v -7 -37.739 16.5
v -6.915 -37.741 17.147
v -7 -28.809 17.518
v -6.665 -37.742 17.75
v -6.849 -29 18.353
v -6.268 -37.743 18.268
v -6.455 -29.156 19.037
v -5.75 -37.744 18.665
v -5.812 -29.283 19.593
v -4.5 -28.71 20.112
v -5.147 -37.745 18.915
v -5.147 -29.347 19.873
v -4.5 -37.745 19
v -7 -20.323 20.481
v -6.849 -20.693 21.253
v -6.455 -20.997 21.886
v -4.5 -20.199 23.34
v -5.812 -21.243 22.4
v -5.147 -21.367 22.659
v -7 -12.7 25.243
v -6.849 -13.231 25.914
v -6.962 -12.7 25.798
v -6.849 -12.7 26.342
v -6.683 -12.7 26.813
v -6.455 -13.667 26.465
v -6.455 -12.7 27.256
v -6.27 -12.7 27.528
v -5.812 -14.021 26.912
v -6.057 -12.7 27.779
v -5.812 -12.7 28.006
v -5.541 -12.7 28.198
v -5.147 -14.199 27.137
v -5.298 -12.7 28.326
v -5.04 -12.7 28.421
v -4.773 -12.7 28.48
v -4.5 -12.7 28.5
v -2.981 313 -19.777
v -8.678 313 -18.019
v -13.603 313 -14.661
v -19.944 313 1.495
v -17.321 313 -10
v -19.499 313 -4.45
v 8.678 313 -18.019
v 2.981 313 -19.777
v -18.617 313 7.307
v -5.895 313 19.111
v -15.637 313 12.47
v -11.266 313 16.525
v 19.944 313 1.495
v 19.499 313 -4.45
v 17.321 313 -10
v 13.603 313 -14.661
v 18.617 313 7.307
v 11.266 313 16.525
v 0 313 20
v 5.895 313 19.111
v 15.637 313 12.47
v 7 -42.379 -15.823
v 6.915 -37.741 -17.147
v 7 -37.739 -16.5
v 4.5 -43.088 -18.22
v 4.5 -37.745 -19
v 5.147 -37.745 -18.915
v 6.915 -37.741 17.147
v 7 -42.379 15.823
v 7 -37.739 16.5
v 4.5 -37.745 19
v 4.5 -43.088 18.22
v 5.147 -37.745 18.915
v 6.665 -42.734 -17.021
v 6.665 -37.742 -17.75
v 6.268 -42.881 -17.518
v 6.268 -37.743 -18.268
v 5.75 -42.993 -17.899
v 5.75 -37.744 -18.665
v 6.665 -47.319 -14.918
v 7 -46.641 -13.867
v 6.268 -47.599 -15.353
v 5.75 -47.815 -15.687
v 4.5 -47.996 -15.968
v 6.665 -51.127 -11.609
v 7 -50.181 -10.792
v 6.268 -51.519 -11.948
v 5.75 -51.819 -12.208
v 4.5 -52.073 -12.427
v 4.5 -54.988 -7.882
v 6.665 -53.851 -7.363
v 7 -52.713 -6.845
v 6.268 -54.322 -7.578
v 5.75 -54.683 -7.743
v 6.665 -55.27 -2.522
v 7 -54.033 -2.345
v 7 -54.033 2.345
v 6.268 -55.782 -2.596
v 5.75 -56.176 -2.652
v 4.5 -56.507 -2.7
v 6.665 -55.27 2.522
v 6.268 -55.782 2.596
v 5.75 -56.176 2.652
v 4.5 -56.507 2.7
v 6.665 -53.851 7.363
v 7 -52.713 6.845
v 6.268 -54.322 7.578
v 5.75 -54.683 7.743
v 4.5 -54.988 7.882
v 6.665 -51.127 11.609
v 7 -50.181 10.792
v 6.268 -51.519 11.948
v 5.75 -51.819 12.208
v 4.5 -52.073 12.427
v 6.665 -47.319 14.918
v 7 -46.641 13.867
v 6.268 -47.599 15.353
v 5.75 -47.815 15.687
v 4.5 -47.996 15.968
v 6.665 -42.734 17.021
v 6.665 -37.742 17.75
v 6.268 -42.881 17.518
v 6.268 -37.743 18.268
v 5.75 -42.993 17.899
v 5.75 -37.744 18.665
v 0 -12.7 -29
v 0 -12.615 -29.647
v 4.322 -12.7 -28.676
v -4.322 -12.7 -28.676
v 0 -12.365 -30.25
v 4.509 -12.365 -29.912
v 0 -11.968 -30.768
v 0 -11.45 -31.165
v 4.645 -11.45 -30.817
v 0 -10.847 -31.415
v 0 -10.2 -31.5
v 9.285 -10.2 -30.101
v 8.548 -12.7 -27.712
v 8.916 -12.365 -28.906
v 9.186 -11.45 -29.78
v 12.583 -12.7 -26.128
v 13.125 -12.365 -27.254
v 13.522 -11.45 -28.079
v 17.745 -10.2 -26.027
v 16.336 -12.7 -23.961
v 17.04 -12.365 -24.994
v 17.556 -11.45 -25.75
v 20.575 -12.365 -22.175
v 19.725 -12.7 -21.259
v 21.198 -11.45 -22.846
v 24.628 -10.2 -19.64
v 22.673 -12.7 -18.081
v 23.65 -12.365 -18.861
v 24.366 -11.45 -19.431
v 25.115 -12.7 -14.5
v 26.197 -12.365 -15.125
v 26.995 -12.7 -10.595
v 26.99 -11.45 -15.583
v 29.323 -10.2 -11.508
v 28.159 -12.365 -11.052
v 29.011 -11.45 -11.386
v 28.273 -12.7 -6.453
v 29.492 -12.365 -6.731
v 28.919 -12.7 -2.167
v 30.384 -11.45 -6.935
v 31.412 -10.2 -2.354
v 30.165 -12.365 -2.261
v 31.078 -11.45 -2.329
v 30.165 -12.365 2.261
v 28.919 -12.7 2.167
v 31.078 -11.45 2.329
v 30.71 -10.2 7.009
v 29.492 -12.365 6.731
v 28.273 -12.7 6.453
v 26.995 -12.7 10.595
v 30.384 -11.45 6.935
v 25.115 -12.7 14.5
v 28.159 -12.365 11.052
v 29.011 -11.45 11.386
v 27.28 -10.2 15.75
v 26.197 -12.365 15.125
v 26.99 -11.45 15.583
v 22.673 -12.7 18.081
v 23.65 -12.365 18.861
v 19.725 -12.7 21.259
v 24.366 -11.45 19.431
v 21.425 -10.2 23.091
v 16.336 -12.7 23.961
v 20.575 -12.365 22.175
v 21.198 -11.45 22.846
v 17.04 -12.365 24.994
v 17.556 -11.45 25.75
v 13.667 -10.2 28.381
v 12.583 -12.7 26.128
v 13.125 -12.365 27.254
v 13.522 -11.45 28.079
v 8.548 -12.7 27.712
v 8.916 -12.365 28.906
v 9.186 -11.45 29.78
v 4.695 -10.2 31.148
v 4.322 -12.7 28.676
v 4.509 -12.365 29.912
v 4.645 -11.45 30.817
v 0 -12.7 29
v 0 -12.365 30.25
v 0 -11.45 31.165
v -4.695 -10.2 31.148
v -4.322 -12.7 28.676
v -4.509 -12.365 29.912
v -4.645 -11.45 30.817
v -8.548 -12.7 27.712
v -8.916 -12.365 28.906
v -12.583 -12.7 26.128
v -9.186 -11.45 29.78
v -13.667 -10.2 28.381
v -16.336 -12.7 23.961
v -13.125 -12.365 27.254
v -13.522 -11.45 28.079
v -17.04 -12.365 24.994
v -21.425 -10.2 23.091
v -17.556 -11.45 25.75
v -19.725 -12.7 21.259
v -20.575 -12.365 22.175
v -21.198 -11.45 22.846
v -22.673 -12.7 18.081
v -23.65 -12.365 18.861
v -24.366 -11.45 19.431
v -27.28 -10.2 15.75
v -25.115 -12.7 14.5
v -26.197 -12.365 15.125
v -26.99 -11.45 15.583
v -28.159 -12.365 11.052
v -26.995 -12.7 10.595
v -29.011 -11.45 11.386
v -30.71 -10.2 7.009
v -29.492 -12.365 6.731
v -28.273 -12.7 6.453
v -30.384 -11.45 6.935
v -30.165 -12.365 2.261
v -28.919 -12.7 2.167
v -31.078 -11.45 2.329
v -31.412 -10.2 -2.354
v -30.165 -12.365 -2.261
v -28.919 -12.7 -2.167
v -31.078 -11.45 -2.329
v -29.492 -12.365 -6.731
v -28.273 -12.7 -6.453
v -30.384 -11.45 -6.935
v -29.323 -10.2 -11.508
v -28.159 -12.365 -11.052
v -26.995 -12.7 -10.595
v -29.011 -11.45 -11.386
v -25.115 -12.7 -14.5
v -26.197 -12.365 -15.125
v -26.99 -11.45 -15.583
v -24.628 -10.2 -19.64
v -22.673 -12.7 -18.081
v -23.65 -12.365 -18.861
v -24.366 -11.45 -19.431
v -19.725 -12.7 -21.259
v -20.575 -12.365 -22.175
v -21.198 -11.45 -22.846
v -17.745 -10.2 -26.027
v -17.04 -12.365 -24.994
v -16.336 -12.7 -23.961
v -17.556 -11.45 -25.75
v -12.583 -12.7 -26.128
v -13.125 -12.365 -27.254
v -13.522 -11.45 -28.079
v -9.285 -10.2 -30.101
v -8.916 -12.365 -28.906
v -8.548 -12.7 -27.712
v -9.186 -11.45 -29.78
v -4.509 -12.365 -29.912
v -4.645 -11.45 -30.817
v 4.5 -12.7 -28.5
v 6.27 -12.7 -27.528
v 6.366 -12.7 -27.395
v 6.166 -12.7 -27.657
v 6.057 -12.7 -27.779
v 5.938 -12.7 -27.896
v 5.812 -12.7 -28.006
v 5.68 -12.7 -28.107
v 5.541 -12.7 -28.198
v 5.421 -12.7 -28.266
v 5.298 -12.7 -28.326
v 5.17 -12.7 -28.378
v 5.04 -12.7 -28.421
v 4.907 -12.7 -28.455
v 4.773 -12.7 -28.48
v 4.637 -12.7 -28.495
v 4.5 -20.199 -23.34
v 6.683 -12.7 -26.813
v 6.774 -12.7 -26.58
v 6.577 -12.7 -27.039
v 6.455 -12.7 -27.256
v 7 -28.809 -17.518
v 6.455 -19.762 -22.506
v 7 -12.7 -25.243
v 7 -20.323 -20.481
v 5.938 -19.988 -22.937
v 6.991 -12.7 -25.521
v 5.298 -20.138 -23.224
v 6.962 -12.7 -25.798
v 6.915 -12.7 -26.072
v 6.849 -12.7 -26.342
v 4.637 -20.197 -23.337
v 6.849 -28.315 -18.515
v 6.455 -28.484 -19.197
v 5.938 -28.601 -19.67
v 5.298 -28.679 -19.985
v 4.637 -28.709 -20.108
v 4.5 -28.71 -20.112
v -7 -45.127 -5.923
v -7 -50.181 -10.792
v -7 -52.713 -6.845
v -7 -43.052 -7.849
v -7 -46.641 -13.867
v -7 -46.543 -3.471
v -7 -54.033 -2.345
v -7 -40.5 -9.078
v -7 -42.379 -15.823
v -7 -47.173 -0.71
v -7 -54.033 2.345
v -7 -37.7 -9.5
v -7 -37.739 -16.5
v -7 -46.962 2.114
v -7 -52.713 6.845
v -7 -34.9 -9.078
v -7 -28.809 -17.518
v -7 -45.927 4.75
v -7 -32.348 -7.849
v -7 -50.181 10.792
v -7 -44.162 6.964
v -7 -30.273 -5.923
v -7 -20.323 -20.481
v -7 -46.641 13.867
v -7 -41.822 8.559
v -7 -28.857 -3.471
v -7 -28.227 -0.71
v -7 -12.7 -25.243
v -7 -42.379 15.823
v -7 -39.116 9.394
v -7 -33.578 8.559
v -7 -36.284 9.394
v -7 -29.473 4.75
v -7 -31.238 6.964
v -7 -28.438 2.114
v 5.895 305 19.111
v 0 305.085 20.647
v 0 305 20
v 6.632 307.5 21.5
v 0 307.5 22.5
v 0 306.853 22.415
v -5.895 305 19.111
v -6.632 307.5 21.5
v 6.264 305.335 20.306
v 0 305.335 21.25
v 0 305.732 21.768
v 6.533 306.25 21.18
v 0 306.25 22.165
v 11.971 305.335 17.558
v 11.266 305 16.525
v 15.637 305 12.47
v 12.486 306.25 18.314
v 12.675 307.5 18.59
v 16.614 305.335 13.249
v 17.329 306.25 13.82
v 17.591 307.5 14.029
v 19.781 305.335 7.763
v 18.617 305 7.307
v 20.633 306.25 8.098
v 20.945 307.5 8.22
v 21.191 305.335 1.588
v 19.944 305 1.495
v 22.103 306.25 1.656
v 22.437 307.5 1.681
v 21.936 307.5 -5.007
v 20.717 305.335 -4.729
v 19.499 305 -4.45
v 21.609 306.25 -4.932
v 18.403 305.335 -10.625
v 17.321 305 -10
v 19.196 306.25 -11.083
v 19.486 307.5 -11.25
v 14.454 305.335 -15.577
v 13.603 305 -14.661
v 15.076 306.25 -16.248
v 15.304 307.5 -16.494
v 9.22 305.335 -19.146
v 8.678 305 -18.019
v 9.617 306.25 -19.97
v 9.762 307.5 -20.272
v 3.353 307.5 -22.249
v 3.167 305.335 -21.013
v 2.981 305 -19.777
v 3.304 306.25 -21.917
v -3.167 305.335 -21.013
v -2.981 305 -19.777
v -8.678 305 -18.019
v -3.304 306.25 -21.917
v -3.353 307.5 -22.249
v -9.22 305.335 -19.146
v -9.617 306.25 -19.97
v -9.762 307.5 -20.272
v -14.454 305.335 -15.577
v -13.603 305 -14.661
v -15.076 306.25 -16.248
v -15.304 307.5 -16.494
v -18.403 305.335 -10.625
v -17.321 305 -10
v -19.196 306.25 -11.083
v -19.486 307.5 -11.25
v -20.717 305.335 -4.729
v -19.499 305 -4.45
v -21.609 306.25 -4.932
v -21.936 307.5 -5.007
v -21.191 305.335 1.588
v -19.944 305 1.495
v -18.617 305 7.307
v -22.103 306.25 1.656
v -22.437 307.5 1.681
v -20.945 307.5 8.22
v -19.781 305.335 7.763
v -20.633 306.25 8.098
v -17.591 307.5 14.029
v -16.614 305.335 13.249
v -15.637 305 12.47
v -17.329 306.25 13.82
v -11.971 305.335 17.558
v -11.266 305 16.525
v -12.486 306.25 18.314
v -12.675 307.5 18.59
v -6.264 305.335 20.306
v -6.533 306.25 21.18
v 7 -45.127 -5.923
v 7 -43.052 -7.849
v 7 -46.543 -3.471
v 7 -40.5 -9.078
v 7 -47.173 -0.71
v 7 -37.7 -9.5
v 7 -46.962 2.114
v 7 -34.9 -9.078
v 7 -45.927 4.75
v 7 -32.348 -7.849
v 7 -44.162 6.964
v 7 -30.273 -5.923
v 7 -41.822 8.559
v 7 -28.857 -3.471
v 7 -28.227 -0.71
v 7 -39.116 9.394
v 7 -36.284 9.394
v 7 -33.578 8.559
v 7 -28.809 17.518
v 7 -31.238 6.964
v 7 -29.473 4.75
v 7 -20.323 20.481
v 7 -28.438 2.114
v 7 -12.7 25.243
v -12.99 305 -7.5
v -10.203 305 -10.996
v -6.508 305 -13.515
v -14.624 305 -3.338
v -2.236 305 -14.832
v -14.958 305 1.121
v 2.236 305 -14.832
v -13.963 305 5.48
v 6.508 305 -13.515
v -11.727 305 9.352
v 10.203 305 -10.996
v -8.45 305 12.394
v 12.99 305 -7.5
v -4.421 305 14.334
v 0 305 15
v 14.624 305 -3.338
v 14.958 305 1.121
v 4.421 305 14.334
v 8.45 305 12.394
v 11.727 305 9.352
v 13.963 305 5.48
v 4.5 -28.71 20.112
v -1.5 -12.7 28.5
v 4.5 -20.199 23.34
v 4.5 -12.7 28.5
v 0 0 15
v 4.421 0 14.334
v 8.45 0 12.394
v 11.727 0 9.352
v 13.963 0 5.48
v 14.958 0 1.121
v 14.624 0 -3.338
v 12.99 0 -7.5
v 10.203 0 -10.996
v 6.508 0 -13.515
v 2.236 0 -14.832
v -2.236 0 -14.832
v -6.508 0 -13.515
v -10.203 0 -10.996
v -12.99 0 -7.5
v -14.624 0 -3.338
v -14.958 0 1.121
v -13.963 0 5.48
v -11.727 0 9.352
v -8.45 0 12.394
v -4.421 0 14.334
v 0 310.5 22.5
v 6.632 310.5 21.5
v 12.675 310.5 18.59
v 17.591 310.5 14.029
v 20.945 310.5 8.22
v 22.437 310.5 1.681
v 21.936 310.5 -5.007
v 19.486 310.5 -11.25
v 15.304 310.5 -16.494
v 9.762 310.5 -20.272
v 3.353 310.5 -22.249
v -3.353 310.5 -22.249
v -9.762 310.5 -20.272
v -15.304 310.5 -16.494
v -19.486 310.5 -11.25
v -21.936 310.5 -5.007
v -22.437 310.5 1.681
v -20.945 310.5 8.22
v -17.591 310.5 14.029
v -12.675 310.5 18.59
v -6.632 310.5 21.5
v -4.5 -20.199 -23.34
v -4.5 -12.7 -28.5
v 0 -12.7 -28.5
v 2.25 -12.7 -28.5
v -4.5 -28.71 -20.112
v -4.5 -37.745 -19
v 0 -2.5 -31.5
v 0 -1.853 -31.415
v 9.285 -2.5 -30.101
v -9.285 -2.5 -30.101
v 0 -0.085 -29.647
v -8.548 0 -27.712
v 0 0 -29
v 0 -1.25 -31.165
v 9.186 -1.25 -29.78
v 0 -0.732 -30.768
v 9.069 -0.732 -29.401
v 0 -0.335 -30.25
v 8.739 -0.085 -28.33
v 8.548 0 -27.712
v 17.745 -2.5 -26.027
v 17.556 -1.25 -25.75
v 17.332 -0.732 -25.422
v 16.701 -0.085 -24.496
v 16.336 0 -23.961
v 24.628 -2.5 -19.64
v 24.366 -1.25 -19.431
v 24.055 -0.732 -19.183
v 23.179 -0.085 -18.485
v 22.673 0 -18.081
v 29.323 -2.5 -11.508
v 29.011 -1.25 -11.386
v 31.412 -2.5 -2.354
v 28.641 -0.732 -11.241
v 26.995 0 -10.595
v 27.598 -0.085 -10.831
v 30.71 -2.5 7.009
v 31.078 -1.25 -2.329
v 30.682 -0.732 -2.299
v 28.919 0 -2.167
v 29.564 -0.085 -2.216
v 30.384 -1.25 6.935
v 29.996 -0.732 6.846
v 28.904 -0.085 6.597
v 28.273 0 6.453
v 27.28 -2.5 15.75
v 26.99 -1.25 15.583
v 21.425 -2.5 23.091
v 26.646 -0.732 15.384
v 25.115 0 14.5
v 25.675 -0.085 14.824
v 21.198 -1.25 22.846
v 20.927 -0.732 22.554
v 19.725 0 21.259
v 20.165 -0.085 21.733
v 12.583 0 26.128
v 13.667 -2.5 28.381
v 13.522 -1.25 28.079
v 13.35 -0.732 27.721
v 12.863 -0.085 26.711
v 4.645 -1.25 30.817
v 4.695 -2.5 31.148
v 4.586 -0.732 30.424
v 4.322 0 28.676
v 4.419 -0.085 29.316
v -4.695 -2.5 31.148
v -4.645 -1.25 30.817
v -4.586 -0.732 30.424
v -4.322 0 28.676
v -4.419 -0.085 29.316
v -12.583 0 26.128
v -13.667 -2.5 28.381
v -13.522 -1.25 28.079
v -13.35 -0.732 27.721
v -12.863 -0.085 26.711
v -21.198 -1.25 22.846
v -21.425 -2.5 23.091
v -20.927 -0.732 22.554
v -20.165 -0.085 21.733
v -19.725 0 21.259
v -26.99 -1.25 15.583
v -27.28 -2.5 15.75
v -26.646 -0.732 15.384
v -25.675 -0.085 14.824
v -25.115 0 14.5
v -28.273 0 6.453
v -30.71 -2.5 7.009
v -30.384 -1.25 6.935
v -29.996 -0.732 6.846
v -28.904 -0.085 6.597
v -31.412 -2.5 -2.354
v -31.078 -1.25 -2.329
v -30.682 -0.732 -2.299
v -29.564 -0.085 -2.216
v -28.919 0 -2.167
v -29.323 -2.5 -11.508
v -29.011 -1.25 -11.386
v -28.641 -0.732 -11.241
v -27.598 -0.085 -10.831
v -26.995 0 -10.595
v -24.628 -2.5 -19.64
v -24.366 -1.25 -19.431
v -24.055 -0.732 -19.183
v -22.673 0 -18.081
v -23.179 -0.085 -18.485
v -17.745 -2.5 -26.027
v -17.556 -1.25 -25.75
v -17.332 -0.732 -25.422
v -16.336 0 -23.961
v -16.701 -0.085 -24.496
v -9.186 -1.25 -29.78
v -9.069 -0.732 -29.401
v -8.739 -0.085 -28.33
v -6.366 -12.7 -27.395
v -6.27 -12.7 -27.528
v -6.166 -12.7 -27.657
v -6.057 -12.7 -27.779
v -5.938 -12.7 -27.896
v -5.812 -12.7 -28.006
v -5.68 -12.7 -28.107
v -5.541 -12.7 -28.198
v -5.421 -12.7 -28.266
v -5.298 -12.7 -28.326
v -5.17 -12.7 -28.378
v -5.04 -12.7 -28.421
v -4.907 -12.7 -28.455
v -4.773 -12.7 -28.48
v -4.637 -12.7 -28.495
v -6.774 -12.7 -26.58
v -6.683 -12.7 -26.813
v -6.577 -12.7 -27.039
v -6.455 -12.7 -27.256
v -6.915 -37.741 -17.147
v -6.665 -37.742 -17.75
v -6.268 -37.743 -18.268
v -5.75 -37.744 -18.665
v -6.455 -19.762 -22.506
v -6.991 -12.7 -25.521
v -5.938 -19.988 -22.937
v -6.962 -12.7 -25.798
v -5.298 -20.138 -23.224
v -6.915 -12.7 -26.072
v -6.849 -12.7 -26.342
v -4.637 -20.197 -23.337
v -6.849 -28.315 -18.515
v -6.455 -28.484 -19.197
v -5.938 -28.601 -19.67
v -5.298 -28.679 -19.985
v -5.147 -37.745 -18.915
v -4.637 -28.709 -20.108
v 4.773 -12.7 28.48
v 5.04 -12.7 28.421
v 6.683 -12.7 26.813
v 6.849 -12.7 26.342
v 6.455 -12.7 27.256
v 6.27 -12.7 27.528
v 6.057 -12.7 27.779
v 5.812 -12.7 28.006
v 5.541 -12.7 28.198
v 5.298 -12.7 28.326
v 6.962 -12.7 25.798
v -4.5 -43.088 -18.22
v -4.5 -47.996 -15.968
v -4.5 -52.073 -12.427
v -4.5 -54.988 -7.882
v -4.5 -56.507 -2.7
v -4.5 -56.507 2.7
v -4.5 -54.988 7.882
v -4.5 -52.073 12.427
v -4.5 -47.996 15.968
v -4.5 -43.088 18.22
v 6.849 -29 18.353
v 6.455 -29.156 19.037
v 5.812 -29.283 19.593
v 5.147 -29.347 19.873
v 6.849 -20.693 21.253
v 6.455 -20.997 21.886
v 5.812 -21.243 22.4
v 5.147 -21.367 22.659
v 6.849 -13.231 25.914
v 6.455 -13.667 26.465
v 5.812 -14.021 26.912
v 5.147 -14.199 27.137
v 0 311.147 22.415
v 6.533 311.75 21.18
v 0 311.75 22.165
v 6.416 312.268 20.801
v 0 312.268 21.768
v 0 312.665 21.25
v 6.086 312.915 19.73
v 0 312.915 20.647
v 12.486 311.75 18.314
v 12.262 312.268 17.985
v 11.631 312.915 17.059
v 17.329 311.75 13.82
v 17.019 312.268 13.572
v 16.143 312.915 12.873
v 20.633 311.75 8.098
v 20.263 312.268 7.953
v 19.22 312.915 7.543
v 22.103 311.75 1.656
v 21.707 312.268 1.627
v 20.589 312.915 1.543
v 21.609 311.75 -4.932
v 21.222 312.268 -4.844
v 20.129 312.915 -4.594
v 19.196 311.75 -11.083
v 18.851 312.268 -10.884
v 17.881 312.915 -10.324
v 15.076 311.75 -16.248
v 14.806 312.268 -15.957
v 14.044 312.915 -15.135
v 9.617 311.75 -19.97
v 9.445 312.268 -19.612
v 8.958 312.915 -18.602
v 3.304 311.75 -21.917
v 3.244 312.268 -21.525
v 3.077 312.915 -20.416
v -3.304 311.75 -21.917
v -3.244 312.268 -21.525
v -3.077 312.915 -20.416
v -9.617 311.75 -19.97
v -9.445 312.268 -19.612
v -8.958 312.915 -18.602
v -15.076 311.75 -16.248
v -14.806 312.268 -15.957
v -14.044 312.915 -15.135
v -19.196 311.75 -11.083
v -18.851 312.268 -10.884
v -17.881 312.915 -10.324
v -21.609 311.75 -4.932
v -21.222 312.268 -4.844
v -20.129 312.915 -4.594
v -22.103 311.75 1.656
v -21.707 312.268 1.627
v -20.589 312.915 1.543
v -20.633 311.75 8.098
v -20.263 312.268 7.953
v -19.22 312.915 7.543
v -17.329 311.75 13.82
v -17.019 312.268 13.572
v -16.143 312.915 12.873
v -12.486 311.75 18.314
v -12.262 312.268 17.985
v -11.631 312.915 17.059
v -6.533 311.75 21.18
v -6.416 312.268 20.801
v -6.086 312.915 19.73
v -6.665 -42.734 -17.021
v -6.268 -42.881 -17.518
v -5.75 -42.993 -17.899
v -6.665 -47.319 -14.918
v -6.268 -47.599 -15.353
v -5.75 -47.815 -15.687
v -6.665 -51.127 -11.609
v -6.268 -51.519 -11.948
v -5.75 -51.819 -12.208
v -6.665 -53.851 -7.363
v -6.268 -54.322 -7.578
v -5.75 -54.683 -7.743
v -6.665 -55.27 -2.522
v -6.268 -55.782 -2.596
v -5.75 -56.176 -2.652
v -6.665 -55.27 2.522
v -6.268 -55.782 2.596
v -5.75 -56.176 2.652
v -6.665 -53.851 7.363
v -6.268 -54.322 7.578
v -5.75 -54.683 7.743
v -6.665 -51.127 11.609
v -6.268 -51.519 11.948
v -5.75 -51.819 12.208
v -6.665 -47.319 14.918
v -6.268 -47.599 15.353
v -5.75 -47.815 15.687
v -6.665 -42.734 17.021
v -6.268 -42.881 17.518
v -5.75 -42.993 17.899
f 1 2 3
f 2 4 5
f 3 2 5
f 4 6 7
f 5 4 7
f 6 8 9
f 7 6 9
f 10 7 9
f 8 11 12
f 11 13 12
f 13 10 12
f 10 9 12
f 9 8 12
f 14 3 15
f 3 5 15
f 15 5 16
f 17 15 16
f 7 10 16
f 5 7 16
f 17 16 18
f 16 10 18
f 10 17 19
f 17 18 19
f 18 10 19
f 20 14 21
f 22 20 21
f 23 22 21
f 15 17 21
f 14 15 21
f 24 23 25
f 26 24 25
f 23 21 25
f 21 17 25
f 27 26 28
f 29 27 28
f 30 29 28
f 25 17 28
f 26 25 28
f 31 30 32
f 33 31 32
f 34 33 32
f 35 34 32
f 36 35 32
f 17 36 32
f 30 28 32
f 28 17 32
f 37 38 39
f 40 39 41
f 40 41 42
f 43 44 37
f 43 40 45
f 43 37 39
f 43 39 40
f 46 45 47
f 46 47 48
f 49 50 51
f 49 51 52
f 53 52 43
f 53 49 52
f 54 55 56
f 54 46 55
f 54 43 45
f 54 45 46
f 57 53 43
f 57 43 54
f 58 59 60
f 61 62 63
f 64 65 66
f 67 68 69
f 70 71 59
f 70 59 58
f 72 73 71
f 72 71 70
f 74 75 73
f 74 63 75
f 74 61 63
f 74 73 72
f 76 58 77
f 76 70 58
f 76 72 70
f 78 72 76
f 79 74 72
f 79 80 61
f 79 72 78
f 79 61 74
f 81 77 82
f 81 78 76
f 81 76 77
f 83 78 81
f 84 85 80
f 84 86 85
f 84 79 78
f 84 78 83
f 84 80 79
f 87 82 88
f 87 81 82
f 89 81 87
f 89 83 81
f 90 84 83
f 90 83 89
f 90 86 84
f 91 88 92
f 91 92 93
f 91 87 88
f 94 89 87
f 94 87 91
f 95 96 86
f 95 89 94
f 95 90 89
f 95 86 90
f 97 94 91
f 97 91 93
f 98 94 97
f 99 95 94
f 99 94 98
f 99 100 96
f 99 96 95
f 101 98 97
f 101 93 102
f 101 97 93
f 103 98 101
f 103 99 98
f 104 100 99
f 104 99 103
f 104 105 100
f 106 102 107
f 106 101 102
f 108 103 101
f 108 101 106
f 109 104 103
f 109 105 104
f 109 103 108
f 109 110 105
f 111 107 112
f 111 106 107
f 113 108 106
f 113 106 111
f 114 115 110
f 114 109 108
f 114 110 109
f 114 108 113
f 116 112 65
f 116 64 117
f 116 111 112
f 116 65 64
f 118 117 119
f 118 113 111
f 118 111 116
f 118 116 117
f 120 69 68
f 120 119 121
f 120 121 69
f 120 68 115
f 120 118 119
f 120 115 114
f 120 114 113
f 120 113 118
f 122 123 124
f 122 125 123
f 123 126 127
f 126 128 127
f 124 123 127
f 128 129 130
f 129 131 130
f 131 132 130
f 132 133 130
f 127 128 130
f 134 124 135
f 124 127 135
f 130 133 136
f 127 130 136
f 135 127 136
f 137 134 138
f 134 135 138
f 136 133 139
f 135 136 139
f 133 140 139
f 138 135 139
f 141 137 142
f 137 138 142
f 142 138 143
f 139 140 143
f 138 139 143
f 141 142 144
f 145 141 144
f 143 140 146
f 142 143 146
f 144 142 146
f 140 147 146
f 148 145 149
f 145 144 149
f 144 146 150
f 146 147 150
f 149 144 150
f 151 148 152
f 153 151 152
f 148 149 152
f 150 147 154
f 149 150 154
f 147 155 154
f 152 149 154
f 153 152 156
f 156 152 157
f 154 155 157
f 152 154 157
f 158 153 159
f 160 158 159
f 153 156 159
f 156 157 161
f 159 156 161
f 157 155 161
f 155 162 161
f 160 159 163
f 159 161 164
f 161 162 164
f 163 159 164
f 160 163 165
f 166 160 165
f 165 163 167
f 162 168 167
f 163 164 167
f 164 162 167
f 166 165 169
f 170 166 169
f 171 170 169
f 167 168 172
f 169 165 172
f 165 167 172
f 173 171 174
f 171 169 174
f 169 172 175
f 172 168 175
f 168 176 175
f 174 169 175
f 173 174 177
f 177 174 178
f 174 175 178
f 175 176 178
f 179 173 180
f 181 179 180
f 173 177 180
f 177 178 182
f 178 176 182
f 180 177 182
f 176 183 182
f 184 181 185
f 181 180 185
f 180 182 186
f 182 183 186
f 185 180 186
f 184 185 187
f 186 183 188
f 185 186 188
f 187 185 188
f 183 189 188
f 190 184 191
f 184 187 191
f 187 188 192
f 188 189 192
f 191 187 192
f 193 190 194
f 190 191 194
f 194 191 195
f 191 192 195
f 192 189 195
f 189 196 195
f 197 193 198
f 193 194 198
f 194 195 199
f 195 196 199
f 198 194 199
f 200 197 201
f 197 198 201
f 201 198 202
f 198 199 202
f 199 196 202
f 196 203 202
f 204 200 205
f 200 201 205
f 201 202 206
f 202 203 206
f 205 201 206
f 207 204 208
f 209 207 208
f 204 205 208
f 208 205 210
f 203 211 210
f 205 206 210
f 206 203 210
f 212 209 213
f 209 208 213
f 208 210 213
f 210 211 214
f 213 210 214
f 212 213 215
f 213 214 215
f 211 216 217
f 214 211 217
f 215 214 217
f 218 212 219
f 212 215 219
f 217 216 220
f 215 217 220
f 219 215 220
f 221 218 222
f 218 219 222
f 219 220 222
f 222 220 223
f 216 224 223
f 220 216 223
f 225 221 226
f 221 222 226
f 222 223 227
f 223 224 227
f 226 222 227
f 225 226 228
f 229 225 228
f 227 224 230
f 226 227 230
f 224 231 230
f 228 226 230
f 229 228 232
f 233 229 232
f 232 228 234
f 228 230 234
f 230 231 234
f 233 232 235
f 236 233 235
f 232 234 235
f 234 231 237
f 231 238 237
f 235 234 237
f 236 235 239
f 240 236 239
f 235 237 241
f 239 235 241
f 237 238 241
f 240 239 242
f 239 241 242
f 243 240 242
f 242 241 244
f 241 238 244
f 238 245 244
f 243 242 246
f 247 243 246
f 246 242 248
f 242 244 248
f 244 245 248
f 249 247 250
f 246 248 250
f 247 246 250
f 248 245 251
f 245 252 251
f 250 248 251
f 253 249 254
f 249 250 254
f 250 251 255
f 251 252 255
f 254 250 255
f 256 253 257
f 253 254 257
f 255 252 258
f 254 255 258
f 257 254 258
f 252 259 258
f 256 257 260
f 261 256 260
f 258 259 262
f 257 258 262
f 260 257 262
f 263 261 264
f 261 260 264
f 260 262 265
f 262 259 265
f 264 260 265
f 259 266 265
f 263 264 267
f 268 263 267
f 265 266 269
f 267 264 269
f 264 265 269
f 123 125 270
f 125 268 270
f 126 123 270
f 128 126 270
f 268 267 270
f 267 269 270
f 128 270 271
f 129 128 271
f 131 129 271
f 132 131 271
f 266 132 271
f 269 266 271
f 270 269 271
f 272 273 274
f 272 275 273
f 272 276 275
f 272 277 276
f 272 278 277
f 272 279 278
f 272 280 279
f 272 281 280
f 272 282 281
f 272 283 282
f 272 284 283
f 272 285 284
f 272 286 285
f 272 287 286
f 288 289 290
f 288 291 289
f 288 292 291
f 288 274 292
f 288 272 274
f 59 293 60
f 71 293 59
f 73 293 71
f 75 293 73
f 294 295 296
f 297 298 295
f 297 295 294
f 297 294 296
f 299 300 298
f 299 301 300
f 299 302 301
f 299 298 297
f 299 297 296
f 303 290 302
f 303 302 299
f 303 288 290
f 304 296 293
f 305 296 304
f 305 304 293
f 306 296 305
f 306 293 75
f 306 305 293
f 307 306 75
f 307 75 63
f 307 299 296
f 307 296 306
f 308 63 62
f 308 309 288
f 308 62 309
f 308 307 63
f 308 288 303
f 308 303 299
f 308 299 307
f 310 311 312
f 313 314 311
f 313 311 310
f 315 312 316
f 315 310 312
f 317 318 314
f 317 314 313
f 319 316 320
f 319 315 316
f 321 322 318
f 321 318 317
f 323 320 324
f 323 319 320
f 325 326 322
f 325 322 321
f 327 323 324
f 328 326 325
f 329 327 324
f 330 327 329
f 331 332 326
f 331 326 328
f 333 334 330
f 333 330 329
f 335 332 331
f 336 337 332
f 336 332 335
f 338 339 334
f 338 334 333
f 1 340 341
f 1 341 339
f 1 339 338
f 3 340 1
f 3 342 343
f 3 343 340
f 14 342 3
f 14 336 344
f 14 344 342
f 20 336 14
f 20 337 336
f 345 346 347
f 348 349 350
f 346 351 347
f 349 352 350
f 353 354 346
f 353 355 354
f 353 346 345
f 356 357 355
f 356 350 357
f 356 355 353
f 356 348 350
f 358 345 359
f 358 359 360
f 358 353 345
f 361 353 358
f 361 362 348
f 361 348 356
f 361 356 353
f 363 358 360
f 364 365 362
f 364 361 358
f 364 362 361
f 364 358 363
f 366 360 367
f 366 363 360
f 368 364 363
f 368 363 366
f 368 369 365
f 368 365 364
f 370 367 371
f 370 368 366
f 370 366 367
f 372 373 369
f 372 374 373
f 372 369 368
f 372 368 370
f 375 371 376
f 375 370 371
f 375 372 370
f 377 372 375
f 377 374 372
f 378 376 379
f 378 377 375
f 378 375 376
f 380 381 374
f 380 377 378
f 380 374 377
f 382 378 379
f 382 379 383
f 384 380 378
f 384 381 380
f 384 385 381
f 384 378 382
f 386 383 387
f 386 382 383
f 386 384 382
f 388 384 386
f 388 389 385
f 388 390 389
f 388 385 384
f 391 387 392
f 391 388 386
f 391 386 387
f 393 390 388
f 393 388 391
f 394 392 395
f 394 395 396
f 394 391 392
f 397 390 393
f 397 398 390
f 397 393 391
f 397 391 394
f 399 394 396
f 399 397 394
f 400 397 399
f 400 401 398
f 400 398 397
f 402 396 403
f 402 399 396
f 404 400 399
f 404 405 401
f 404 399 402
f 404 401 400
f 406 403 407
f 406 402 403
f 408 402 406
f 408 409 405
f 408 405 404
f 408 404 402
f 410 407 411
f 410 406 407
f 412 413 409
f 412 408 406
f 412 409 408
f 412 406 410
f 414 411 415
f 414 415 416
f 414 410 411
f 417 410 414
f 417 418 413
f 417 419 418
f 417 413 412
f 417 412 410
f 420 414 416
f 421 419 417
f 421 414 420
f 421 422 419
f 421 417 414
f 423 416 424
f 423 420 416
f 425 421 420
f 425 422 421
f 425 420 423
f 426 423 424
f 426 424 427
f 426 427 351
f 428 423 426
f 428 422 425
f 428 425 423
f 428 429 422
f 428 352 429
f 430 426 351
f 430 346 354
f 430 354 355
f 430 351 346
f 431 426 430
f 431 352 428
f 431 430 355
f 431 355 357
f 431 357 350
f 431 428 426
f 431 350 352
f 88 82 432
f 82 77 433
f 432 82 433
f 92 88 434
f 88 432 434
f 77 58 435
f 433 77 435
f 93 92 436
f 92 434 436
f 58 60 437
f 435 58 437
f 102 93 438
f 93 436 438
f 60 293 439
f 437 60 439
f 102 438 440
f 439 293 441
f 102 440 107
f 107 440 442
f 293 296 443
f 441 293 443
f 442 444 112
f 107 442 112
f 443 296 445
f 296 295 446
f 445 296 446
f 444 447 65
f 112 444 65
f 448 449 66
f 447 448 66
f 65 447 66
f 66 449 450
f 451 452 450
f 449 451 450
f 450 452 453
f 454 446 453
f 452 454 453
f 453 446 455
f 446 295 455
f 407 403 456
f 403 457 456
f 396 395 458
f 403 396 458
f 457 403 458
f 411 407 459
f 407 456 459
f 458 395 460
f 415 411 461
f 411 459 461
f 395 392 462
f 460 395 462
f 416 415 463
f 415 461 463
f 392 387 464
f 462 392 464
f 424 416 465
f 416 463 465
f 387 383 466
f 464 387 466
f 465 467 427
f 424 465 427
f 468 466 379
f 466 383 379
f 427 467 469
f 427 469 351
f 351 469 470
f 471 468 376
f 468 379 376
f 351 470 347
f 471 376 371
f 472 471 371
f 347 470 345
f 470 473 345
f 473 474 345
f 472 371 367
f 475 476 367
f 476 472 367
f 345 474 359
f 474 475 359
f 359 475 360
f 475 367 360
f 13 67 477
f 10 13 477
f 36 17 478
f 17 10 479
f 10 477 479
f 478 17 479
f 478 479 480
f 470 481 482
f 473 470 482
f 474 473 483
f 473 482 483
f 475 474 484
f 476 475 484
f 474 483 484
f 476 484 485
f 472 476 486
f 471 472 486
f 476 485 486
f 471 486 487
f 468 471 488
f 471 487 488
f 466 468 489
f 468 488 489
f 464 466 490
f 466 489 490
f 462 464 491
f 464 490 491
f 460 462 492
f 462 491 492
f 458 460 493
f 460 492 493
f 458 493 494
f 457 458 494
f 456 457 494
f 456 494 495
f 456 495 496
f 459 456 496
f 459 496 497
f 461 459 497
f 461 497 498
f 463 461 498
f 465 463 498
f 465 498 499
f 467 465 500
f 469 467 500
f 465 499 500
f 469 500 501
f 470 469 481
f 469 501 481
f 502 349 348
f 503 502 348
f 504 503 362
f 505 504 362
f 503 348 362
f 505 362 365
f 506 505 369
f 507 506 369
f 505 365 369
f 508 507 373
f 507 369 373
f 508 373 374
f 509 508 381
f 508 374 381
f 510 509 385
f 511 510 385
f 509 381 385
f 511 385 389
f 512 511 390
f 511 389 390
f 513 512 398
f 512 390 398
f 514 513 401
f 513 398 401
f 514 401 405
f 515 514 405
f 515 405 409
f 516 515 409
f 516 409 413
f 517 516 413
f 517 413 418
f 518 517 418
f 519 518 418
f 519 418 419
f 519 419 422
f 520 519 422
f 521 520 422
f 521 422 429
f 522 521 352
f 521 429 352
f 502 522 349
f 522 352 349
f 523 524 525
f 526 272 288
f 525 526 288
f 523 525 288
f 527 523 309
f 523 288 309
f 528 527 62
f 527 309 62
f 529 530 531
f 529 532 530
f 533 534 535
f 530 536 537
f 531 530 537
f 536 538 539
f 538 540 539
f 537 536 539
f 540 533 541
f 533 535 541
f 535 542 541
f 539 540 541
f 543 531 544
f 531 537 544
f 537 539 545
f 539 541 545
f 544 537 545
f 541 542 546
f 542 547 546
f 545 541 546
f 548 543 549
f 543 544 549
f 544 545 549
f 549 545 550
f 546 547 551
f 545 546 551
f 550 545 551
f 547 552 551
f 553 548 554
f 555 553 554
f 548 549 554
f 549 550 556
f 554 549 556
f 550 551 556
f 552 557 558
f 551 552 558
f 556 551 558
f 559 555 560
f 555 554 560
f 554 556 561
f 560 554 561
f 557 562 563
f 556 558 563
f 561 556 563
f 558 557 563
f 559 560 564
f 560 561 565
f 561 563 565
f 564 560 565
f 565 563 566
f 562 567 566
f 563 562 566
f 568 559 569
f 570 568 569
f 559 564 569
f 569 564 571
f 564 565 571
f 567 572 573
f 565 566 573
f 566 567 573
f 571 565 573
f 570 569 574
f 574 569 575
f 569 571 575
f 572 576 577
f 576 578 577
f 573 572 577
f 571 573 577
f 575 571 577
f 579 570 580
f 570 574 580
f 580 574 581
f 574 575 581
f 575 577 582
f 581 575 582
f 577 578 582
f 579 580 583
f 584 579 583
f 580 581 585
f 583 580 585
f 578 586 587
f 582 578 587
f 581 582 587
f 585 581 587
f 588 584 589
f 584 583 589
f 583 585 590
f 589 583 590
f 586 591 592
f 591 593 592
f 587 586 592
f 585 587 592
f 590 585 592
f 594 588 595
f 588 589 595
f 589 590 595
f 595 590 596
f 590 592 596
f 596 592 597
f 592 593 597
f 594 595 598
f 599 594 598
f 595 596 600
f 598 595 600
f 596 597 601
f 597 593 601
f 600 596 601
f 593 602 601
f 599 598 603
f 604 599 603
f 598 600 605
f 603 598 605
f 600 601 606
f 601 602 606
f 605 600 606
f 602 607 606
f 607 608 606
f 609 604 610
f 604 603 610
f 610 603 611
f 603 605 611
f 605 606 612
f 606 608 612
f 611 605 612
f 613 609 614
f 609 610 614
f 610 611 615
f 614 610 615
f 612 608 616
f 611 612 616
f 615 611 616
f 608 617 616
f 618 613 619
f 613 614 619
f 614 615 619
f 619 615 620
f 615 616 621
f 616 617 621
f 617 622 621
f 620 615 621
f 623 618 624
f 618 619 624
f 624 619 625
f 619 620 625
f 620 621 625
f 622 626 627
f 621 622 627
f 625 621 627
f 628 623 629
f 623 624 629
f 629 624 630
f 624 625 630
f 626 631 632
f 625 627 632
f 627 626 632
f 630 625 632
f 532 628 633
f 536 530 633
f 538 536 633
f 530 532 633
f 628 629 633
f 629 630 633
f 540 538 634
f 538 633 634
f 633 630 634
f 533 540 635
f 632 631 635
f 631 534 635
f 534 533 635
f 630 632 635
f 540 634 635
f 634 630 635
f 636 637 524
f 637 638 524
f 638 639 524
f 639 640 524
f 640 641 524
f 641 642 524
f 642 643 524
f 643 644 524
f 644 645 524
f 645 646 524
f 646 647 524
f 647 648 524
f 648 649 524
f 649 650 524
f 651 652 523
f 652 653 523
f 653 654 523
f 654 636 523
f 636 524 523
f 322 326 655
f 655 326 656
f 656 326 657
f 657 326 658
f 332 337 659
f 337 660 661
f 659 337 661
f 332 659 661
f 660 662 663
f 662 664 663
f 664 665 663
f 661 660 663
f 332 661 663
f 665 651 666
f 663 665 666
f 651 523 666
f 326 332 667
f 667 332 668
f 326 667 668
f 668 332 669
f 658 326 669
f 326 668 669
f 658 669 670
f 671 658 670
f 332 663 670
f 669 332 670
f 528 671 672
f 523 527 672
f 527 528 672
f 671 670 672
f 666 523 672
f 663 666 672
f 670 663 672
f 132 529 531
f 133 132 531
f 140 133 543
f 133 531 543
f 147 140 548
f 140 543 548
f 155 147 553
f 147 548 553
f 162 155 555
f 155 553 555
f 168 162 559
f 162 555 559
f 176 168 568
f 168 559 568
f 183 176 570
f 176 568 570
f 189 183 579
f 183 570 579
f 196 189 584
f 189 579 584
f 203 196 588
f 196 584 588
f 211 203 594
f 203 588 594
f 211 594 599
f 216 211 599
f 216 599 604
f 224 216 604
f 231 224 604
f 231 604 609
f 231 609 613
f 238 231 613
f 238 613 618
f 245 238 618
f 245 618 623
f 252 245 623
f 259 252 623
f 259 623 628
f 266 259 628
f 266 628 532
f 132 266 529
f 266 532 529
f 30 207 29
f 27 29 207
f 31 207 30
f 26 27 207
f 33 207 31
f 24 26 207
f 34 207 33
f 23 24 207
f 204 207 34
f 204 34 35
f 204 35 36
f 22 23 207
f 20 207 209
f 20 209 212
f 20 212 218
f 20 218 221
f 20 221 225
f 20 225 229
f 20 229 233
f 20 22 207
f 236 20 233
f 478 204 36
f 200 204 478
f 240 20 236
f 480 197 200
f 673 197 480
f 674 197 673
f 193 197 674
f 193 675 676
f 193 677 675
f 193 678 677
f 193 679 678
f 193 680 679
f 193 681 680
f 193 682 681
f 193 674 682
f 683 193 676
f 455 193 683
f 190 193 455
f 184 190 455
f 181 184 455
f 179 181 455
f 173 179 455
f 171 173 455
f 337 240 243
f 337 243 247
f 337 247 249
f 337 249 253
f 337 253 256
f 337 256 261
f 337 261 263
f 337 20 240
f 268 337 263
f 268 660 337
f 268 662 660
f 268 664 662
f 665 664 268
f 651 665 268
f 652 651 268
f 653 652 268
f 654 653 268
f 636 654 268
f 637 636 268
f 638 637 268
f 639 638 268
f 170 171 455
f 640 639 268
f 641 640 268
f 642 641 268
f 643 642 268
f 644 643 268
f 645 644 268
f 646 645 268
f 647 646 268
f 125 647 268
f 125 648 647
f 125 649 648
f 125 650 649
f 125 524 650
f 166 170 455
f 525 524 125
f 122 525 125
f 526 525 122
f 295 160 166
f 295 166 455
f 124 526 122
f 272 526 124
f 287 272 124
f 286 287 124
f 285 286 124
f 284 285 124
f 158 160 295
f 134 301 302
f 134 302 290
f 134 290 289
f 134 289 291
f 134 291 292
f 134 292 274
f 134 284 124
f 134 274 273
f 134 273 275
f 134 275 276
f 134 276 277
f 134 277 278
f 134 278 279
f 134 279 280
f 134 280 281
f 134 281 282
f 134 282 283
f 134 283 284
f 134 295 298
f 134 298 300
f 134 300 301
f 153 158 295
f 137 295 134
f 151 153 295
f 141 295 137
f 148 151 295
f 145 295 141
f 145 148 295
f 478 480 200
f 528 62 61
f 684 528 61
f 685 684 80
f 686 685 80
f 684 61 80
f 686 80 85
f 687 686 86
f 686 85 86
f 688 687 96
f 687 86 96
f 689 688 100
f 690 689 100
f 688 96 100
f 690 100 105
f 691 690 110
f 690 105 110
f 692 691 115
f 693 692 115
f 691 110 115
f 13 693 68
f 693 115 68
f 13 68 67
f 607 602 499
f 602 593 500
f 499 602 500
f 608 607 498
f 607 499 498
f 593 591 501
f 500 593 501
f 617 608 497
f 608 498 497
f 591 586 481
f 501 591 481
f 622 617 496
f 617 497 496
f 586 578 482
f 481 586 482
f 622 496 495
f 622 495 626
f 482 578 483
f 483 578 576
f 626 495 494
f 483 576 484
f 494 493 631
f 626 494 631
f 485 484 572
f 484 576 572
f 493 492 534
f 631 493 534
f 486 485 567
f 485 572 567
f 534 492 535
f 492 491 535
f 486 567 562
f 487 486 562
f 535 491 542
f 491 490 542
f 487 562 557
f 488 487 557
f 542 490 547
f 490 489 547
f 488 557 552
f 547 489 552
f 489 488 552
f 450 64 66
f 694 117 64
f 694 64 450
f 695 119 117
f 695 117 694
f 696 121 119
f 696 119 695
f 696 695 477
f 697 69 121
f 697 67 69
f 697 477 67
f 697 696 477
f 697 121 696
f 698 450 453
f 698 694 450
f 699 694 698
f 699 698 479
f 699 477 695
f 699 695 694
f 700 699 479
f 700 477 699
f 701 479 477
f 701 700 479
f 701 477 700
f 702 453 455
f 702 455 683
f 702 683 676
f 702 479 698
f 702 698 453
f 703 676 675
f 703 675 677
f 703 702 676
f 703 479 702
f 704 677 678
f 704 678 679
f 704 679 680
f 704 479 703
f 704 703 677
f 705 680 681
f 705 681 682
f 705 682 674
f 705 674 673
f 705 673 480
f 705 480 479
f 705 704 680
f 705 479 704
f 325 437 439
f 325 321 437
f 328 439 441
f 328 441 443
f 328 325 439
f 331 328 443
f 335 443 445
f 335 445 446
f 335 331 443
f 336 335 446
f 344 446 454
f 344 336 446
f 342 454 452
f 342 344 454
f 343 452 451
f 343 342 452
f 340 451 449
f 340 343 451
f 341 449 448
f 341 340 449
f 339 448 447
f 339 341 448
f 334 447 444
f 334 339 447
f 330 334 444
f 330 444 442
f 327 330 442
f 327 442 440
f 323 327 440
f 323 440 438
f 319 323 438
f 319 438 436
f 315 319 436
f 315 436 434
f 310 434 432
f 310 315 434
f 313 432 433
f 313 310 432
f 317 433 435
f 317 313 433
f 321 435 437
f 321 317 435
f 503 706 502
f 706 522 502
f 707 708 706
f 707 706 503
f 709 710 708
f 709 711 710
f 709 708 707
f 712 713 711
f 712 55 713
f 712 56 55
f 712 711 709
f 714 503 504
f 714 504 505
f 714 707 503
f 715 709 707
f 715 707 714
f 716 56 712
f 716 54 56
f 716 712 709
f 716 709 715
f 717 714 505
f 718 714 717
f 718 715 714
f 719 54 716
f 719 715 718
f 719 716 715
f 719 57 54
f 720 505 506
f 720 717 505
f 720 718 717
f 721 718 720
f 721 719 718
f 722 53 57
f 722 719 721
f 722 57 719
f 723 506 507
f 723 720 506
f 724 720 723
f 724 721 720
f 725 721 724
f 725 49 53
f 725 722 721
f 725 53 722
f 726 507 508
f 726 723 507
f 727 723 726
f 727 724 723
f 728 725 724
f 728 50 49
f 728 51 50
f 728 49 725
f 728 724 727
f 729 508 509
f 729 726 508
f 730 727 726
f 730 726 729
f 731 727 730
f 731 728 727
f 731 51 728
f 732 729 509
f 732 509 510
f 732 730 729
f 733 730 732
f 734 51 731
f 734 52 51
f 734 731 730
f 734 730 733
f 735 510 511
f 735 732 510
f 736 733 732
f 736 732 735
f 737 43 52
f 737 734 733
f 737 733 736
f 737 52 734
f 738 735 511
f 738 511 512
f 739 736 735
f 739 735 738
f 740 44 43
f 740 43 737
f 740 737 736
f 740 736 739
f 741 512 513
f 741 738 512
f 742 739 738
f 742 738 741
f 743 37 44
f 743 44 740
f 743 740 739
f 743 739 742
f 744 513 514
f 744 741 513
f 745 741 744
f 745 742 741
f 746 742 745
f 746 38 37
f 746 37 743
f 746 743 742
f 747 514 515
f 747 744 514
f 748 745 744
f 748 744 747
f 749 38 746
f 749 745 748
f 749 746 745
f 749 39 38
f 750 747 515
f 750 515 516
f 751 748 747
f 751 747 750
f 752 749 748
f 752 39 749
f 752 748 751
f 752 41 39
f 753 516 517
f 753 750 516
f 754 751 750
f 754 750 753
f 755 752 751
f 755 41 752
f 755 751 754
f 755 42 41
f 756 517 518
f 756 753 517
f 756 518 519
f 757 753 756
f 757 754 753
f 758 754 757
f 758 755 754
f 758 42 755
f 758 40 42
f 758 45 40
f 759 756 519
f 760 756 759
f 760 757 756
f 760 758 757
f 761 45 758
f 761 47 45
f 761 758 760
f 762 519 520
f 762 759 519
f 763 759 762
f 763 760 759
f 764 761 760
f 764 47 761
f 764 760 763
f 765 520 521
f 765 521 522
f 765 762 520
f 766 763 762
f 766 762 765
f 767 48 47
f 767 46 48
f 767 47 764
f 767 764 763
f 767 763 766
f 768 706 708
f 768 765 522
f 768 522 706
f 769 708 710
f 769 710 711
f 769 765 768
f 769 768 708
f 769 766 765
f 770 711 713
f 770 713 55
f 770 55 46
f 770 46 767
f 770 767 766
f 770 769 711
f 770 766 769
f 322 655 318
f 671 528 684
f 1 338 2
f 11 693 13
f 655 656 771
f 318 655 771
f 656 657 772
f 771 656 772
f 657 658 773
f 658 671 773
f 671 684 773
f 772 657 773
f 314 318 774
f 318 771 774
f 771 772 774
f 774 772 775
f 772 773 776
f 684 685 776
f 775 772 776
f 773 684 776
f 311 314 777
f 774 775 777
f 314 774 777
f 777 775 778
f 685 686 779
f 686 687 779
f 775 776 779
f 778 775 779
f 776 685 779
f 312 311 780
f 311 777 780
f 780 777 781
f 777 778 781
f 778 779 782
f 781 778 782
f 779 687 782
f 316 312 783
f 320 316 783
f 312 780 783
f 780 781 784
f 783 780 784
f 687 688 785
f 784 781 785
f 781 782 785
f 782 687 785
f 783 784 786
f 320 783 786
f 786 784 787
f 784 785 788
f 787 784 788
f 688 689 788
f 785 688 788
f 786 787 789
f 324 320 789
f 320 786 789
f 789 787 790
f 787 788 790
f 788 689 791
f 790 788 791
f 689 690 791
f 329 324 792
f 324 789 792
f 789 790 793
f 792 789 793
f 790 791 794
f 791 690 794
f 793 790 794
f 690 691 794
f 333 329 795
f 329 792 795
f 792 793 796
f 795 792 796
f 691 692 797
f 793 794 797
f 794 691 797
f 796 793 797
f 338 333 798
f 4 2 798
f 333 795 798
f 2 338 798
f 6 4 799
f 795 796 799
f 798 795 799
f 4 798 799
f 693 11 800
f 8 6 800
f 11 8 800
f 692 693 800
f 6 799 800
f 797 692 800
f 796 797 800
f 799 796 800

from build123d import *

# Parameters (mm, degrees)
SKETCH1_R           = 15
BOSS_EXTRUDE1_DEPTH = 305
SKETCH2_R           = 22.5
BOSS_EXTRUDE2_DEPTH = 8
SKETCH3_R           = 31.5
BOSS_EXTRUDE3_DEPTH = 12.7
SKETCH4_R           = 9.5
BOSS_EXTRUDE4_DEPTH = 7
FILLET3_R           = 2.5
FILLET4_R           = 2.5
FILLET5_R           = 2.5


with BuildPart() as part:
    # Sketch1 → Boss-Extrude1 (new body)
    with BuildSketch(Plane(origin=(0, 0, 0), x_dir=(1, 0, 0), z_dir=(0, 1, 0))):
        with Locations(Location((0, 0, 0), (0, 0, 270))):
            Circle(SKETCH1_R)
    extrude(amount=BOSS_EXTRUDE1_DEPTH)

    # Sketch2 → Boss-Extrude2 (add)
    with BuildSketch(Plane(origin=(0, 305, 0), x_dir=(1, 0, 0), z_dir=(0, 1, 0))):
        with Locations(Location((0, 0, 0), (0, 0, 270))):
            Circle(SKETCH2_R)
    extrude(amount=BOSS_EXTRUDE2_DEPTH)

    # Sketch3 → Boss-Extrude3 (add)
    with BuildSketch(Plane.XZ):
        with Locations(Location((0, 0, 0), (0, 0, 270))):
            Circle(SKETCH3_R)
    extrude(amount=BOSS_EXTRUDE3_DEPTH)

    # Sketch4 → Boss-Extrude4 (add, symmetric)
    with BuildSketch(Plane(origin=(0, 0, 0), x_dir=(0, 0, -1), z_dir=(1, 0, 0))):
        with BuildLine():
            Line((-28.5, -12.7), (28.5, -12.7))
            ThreePointArc((28.5, -12.7), (21.470051482, -24.357649102), (18.999946854, -37.744939413))
            ThreePointArc((18.999946854, -37.744939413), (0, -56.7), (-18.999946854, -37.744939413))
            ThreePointArc((-18.999946854, -37.744939413), (-21.470051482, -24.357649102), (-28.5, -12.7))
        make_face()
        with Locations((0, -37.7)):
            Circle(SKETCH4_R, mode=Mode.SUBTRACT)
    extrude(amount=BOSS_EXTRUDE4_DEPTH, both=True)

    # Fillet3
    fillet3_edges = [part.edges().sort_by_distance(p)[0] for p in [
        (7, -24.357649102, 21.470051482),
        (7, -56.7, 0),
        (7, -24.357649102, -21.470051482),
        (0, 305, -22.5),
        (0, 313, -22.5),
    ]]
    fillet(fillet3_edges, radius=FILLET3_R)

    # Fillet4
    fillet4_edges = [part.edges().sort_by_distance(p)[0] for p in [
        (-7, -24.357649102, 21.470051482),
        (-7, -56.7, 0),
        (-7, -24.357649102, -21.470051482),
    ]]
    fillet(fillet4_edges, radius=FILLET4_R)

    # Fillet5
    fillet5_edges = [part.edges().sort_by_distance(p)[0] for p in [
        (0, 0, 31.5),
        (0, -12.7, 31.5),
    ]]
    fillet(fillet5_edges, radius=FILLET5_R)


solid = part.part
